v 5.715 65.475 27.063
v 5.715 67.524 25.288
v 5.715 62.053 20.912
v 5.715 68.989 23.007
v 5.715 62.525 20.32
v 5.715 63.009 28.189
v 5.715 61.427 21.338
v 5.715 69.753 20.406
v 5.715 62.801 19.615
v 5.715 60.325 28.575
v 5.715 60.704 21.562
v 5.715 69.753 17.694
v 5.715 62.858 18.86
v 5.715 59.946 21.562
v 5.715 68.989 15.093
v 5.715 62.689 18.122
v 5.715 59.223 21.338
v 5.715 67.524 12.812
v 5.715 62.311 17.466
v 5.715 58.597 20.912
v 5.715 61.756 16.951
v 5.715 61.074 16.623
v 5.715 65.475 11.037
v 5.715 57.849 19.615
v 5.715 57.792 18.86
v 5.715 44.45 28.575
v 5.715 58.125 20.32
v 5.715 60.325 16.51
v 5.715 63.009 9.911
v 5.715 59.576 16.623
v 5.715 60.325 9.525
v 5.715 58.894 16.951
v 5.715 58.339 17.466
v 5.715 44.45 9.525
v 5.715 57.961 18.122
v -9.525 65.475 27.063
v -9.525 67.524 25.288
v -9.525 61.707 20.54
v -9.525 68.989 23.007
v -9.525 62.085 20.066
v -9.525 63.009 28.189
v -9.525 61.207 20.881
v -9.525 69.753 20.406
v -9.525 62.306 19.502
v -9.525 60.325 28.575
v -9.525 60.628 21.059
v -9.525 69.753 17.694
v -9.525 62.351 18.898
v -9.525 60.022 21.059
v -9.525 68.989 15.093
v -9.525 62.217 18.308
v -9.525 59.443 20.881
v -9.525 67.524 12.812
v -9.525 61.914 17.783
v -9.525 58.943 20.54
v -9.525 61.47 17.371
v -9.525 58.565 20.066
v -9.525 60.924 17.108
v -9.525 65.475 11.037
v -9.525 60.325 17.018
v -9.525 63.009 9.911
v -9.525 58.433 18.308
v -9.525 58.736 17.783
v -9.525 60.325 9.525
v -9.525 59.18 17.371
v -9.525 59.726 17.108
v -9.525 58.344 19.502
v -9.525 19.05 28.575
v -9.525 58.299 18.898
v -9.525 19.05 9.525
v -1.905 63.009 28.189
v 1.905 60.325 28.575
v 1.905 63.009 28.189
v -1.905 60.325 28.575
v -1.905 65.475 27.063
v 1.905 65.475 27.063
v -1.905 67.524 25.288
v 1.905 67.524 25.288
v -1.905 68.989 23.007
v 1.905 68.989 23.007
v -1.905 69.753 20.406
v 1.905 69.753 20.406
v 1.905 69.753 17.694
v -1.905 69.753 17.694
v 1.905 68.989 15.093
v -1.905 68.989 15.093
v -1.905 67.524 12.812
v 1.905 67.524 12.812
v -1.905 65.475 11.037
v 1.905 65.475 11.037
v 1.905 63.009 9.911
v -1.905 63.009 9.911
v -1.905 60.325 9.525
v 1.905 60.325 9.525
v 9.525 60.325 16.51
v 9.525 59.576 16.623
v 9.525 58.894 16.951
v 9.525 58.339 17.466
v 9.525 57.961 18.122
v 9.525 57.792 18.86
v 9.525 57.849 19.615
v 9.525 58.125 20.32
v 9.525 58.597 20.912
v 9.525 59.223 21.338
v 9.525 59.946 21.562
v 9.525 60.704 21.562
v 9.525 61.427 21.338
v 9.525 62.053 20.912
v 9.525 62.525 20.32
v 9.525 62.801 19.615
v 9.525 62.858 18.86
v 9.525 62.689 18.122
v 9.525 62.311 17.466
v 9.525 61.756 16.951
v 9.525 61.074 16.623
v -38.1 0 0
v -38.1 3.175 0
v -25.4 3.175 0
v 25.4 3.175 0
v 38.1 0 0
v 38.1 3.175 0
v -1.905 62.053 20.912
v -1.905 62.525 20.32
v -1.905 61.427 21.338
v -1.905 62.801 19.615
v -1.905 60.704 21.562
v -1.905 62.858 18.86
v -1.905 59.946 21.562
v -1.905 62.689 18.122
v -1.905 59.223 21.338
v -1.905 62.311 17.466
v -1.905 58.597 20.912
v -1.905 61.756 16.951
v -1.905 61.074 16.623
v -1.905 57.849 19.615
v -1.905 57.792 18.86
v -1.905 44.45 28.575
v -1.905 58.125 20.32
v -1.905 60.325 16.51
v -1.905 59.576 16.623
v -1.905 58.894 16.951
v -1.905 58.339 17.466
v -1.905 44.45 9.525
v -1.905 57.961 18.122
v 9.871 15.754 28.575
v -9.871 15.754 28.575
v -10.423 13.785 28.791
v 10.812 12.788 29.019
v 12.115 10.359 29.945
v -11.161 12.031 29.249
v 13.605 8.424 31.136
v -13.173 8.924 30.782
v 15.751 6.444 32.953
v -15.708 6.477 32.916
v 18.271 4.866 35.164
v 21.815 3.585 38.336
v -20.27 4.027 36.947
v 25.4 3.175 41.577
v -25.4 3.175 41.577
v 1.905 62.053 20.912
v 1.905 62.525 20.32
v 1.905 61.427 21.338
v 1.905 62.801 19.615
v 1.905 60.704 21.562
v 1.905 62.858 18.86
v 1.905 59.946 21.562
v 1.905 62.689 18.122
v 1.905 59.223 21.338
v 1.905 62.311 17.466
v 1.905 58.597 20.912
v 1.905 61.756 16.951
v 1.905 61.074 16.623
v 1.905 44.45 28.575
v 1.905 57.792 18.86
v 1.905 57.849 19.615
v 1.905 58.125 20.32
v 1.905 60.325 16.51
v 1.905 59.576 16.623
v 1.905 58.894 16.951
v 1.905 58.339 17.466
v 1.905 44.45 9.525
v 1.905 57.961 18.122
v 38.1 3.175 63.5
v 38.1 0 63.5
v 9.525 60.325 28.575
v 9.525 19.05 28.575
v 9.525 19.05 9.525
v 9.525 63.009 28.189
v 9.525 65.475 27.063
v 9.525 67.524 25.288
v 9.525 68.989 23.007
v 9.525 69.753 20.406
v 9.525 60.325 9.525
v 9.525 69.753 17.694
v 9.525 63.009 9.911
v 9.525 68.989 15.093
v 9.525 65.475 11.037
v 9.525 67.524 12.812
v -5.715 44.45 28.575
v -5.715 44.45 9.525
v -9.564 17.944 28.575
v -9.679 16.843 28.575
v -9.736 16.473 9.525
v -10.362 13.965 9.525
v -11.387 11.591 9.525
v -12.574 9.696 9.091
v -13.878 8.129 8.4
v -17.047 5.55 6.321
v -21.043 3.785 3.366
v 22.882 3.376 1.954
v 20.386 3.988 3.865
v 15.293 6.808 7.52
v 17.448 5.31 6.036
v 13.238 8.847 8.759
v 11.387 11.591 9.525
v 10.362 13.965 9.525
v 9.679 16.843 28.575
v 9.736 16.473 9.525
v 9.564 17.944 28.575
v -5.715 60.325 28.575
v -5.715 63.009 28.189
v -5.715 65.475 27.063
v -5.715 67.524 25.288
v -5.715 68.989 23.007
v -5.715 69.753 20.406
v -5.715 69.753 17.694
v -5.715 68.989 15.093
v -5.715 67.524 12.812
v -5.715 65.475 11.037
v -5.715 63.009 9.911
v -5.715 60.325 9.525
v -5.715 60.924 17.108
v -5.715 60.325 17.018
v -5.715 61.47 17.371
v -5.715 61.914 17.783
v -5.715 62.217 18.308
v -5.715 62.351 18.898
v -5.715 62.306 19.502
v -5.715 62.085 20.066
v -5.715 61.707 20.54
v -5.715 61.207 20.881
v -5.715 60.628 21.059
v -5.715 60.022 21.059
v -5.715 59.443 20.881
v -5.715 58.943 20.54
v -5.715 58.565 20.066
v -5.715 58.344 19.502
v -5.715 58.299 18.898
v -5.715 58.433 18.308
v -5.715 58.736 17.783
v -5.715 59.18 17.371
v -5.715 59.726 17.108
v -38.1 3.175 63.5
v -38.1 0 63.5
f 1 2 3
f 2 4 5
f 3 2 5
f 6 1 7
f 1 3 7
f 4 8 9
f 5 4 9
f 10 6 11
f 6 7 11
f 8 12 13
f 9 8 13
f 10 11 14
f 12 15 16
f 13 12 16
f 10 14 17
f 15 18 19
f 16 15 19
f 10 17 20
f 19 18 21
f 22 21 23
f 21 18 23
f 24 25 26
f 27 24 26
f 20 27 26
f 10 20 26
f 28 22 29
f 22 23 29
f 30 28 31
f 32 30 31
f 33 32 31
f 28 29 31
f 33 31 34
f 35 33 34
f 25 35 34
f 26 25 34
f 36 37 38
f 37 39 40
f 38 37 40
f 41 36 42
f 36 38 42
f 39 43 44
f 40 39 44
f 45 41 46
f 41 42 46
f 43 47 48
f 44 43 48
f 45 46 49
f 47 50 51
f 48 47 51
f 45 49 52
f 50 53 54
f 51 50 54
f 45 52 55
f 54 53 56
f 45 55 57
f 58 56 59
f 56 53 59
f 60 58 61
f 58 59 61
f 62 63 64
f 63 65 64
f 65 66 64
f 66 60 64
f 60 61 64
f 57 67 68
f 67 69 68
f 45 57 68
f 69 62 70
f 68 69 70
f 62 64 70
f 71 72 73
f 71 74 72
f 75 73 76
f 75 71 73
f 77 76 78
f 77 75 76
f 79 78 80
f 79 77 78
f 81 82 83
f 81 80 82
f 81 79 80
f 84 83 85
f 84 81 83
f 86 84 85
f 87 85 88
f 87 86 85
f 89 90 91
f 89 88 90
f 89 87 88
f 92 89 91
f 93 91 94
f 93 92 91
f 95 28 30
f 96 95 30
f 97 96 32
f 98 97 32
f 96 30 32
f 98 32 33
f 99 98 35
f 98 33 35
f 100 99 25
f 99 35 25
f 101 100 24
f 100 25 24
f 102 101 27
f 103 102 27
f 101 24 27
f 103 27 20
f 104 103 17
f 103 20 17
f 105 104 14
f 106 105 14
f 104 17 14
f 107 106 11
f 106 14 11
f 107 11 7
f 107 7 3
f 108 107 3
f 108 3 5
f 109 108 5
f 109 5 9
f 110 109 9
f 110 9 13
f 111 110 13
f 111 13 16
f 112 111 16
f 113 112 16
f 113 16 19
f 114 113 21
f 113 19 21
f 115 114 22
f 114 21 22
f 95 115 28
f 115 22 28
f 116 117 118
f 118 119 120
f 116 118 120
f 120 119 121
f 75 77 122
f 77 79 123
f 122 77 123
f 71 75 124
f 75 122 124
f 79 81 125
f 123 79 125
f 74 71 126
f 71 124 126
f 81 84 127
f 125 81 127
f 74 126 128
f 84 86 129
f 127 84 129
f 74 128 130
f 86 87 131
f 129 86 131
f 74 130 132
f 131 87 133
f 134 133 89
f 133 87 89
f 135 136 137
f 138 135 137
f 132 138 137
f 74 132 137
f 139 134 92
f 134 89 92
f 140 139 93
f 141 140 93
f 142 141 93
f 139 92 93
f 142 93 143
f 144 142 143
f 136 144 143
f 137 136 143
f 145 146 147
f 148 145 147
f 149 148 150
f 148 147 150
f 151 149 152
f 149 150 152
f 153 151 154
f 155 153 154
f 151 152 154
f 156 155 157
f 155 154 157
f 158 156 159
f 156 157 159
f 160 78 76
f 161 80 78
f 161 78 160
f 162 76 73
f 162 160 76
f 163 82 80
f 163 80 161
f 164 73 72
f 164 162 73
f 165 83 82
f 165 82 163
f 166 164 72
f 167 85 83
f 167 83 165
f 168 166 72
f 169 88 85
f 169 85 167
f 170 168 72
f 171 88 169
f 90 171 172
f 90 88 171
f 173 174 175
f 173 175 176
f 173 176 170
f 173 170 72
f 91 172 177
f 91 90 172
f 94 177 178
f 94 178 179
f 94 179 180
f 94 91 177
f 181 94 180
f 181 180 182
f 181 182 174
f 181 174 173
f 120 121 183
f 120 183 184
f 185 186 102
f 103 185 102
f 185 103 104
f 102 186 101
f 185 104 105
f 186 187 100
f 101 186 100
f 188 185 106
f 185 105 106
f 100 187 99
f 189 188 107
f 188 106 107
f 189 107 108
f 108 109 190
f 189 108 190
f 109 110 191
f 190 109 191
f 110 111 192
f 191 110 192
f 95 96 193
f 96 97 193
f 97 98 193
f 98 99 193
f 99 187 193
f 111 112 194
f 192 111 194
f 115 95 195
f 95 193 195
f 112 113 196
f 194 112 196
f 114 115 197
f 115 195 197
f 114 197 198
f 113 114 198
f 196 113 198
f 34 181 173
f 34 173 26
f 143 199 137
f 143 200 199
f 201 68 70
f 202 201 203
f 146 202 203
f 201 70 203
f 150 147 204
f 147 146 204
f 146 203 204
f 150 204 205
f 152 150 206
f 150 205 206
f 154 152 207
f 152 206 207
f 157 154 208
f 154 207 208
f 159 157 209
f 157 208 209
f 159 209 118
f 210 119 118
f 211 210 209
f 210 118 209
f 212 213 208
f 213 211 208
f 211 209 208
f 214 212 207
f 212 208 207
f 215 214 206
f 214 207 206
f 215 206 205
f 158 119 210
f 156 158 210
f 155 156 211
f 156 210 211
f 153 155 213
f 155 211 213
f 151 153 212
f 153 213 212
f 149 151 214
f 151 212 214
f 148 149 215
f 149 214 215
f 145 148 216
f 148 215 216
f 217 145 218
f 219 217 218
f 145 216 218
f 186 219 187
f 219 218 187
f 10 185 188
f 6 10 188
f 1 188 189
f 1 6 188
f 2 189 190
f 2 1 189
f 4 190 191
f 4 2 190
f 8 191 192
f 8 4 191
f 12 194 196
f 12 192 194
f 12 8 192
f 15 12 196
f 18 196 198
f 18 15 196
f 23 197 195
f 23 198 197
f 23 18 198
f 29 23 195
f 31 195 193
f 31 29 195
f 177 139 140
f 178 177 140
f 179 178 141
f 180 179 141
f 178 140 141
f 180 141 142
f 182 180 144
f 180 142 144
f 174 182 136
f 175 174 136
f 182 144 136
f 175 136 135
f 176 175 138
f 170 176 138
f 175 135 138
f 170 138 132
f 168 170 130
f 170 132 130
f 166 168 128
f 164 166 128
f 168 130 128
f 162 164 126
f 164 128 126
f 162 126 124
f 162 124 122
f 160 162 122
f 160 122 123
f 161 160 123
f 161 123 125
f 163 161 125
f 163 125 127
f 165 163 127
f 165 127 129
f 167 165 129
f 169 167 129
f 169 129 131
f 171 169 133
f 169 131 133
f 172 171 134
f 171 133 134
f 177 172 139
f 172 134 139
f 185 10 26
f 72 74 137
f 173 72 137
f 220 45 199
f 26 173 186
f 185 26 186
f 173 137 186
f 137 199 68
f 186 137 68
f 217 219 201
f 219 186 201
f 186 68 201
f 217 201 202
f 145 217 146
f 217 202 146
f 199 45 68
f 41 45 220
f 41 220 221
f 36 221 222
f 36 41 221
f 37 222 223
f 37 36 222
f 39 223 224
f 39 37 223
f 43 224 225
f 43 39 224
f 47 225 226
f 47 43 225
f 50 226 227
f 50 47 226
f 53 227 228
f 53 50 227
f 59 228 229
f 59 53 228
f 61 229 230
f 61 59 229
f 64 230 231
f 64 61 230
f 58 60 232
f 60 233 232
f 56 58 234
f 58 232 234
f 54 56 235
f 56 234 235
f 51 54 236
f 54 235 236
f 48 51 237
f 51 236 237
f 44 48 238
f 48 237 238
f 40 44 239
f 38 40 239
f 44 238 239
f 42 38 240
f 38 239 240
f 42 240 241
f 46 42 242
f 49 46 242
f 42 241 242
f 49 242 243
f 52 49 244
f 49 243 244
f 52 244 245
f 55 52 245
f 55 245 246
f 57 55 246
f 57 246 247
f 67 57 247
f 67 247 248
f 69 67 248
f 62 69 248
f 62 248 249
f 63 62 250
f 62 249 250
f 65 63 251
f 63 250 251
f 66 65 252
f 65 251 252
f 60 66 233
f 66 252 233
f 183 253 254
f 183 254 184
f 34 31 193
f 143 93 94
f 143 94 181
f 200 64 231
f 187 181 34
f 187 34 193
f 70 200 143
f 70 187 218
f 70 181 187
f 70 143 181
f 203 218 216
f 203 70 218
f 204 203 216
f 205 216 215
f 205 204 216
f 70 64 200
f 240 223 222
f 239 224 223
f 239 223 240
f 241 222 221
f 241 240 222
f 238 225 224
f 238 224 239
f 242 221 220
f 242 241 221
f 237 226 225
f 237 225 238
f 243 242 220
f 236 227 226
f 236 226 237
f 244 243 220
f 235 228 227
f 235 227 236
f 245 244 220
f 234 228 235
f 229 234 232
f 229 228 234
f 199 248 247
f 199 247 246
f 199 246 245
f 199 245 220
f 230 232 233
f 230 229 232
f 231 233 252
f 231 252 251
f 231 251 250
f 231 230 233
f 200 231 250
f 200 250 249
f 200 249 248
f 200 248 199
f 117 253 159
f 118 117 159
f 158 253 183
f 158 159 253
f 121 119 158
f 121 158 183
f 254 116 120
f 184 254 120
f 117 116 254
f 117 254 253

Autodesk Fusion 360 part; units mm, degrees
sketch "Sketch1" plane through (0, 0, 0) normal (0, 0, 1) x (1, 0, 0)
  line L0 (-38.1, 0) -> (38.1, 0)
  line L1 (-9.525, 0) -> (9.525, 0)
  line L2 (9.525, 0) -> (9.525, 69.85)
  line L3 (9.525, 69.85) -> (-9.525, 69.85)
  line L4 (-9.525, 69.85) -> (-9.525, 0)
  line L5 (-38.1, 0) -> (-38.1, 3.175)
  line L6 (-38.1, 3.175) -> (38.1, 3.175)
  line L7 (38.1, 3.175) -> (38.1, 0)
  circle A0 centre (-25.4, 19.05) radius 15.875
  circle A1 centre (25.4, 19.05) radius 15.875
  line L8 (-9.525, 44.45) -> (9.525, 44.45)
  line L9 (-5.715, 69.85) -> (-5.715, 44.45)
  line L10 (-1.905, 69.85) -> (-1.905, 44.45)
  line L11 (1.905, 69.85) -> (1.905, 44.45)
  line L12 (5.715, 69.85) -> (5.715, 44.45)
  dimension "d2" = 19.05
  dimension "d3" = 9.525
  dimension "d4" = 3.175
  dimension "d5" = 76.2
  dimension "d6" = 31.75
  dimension "d7" = 31.75
  dimension "d17" = 69.85
  dimension "d18" = 3.175
  dimension "d28" = 25.4
  dimension "d29" = 3.81
  dimension "d30" = 3.81
  dimension "d31" = 3.81
  dimension "d32" = 3.81
extrude "Extrude1" add sketch "Sketch1" along normal blind 63.5 contours L0 L4 L5 L6 | L0 L1 L2 L4 L6 | L0 L2 L6 L7 | L4 L6 A0 | L2 L4 L6 L8 | L2 L6 A1 | L3 L4 L8 L9 | L2 L3 L8 L12 | L3 L8 L9 L10 | L3 L8 L11 L12 | L3 L8 L10 L11 makes body 1
sketch "Sketch3" plane through (0, 0, 0) normal (1, 0, 0) x (0, 0, -1)
  line L0 (0, 0) -> (-63.5, 0)
  line L1 (-63.5, 0) -> (-63.5, 69.85)
  line L2 (-63.5, 69.85) -> (0, 69.85)
  line L3 (0, 69.85) -> (0, 0)
  line L4 (-63.5, 3.175) -> (0, 3.175)
  line L5 (-19.05, 69.85) -> (-19.05, 0)
  line L6 (0, 3.175) -> (0, 0)
  line L7 (-9.525, 69.85) -> (-9.525, 0)
  line L8 (-28.575, 69.85) -> (-28.575, 0)
  circle A0 centre (-19.05, 60.325) radius 9.525
  arc A1 (-9.525, 13.9553) -> (0, 3.175) centre (0, 12.7731) ccw
  arc A2 (-41.5769, 3.175) -> (-28.575, 16.6144) centre (-41.5769, 16.184) ccw
  circle A3 centre (-19.05, 60.325) radius 2.54
  circle A4 centre (-19.05, 60.325) radius 2.032
  dimension "d15" = 63.5
  dimension "d16" = 69.85
  dimension "d19" = 3.175
  dimension "d20" = 19.05
  dimension "d21" = 9.525
  dimension "d22" = 9.525
  dimension "d23" = 19.05
  dimension "d25" = 5.08
  dimension "d35" = 4.064
extrude "Extrude2" cut sketch "Sketch3" along normal mid plane 81.28 contours L2 L3 L7 A1 | L2 L7 A0 | L2 L8 A0 | L1 L2 L4 L8 A2 | L5 A3 A4 | L5 A3 A4 | L5 A4 | L5 A4 bodies 1
extrude "Extrude3" cut sketch "Sketch1" along normal blind 33.02 contours L3 L8 L9 L10 | L3 L8 L11 L12 bodies 1
extrude "Extrude4" add sketch "Sketch3" along normal blind -9.525 and the other way blind 5.715 contours L5 A3 A4 | L5 A3 A4 bodies 1
copy_body "Body->Comp1" bodies 1 removing the originals makes body 2 in component "Base"
component "Base" placed x (1, 0, 0) y (0, 1, 0) z (0, 0, 1) at (0, 0, 0)
